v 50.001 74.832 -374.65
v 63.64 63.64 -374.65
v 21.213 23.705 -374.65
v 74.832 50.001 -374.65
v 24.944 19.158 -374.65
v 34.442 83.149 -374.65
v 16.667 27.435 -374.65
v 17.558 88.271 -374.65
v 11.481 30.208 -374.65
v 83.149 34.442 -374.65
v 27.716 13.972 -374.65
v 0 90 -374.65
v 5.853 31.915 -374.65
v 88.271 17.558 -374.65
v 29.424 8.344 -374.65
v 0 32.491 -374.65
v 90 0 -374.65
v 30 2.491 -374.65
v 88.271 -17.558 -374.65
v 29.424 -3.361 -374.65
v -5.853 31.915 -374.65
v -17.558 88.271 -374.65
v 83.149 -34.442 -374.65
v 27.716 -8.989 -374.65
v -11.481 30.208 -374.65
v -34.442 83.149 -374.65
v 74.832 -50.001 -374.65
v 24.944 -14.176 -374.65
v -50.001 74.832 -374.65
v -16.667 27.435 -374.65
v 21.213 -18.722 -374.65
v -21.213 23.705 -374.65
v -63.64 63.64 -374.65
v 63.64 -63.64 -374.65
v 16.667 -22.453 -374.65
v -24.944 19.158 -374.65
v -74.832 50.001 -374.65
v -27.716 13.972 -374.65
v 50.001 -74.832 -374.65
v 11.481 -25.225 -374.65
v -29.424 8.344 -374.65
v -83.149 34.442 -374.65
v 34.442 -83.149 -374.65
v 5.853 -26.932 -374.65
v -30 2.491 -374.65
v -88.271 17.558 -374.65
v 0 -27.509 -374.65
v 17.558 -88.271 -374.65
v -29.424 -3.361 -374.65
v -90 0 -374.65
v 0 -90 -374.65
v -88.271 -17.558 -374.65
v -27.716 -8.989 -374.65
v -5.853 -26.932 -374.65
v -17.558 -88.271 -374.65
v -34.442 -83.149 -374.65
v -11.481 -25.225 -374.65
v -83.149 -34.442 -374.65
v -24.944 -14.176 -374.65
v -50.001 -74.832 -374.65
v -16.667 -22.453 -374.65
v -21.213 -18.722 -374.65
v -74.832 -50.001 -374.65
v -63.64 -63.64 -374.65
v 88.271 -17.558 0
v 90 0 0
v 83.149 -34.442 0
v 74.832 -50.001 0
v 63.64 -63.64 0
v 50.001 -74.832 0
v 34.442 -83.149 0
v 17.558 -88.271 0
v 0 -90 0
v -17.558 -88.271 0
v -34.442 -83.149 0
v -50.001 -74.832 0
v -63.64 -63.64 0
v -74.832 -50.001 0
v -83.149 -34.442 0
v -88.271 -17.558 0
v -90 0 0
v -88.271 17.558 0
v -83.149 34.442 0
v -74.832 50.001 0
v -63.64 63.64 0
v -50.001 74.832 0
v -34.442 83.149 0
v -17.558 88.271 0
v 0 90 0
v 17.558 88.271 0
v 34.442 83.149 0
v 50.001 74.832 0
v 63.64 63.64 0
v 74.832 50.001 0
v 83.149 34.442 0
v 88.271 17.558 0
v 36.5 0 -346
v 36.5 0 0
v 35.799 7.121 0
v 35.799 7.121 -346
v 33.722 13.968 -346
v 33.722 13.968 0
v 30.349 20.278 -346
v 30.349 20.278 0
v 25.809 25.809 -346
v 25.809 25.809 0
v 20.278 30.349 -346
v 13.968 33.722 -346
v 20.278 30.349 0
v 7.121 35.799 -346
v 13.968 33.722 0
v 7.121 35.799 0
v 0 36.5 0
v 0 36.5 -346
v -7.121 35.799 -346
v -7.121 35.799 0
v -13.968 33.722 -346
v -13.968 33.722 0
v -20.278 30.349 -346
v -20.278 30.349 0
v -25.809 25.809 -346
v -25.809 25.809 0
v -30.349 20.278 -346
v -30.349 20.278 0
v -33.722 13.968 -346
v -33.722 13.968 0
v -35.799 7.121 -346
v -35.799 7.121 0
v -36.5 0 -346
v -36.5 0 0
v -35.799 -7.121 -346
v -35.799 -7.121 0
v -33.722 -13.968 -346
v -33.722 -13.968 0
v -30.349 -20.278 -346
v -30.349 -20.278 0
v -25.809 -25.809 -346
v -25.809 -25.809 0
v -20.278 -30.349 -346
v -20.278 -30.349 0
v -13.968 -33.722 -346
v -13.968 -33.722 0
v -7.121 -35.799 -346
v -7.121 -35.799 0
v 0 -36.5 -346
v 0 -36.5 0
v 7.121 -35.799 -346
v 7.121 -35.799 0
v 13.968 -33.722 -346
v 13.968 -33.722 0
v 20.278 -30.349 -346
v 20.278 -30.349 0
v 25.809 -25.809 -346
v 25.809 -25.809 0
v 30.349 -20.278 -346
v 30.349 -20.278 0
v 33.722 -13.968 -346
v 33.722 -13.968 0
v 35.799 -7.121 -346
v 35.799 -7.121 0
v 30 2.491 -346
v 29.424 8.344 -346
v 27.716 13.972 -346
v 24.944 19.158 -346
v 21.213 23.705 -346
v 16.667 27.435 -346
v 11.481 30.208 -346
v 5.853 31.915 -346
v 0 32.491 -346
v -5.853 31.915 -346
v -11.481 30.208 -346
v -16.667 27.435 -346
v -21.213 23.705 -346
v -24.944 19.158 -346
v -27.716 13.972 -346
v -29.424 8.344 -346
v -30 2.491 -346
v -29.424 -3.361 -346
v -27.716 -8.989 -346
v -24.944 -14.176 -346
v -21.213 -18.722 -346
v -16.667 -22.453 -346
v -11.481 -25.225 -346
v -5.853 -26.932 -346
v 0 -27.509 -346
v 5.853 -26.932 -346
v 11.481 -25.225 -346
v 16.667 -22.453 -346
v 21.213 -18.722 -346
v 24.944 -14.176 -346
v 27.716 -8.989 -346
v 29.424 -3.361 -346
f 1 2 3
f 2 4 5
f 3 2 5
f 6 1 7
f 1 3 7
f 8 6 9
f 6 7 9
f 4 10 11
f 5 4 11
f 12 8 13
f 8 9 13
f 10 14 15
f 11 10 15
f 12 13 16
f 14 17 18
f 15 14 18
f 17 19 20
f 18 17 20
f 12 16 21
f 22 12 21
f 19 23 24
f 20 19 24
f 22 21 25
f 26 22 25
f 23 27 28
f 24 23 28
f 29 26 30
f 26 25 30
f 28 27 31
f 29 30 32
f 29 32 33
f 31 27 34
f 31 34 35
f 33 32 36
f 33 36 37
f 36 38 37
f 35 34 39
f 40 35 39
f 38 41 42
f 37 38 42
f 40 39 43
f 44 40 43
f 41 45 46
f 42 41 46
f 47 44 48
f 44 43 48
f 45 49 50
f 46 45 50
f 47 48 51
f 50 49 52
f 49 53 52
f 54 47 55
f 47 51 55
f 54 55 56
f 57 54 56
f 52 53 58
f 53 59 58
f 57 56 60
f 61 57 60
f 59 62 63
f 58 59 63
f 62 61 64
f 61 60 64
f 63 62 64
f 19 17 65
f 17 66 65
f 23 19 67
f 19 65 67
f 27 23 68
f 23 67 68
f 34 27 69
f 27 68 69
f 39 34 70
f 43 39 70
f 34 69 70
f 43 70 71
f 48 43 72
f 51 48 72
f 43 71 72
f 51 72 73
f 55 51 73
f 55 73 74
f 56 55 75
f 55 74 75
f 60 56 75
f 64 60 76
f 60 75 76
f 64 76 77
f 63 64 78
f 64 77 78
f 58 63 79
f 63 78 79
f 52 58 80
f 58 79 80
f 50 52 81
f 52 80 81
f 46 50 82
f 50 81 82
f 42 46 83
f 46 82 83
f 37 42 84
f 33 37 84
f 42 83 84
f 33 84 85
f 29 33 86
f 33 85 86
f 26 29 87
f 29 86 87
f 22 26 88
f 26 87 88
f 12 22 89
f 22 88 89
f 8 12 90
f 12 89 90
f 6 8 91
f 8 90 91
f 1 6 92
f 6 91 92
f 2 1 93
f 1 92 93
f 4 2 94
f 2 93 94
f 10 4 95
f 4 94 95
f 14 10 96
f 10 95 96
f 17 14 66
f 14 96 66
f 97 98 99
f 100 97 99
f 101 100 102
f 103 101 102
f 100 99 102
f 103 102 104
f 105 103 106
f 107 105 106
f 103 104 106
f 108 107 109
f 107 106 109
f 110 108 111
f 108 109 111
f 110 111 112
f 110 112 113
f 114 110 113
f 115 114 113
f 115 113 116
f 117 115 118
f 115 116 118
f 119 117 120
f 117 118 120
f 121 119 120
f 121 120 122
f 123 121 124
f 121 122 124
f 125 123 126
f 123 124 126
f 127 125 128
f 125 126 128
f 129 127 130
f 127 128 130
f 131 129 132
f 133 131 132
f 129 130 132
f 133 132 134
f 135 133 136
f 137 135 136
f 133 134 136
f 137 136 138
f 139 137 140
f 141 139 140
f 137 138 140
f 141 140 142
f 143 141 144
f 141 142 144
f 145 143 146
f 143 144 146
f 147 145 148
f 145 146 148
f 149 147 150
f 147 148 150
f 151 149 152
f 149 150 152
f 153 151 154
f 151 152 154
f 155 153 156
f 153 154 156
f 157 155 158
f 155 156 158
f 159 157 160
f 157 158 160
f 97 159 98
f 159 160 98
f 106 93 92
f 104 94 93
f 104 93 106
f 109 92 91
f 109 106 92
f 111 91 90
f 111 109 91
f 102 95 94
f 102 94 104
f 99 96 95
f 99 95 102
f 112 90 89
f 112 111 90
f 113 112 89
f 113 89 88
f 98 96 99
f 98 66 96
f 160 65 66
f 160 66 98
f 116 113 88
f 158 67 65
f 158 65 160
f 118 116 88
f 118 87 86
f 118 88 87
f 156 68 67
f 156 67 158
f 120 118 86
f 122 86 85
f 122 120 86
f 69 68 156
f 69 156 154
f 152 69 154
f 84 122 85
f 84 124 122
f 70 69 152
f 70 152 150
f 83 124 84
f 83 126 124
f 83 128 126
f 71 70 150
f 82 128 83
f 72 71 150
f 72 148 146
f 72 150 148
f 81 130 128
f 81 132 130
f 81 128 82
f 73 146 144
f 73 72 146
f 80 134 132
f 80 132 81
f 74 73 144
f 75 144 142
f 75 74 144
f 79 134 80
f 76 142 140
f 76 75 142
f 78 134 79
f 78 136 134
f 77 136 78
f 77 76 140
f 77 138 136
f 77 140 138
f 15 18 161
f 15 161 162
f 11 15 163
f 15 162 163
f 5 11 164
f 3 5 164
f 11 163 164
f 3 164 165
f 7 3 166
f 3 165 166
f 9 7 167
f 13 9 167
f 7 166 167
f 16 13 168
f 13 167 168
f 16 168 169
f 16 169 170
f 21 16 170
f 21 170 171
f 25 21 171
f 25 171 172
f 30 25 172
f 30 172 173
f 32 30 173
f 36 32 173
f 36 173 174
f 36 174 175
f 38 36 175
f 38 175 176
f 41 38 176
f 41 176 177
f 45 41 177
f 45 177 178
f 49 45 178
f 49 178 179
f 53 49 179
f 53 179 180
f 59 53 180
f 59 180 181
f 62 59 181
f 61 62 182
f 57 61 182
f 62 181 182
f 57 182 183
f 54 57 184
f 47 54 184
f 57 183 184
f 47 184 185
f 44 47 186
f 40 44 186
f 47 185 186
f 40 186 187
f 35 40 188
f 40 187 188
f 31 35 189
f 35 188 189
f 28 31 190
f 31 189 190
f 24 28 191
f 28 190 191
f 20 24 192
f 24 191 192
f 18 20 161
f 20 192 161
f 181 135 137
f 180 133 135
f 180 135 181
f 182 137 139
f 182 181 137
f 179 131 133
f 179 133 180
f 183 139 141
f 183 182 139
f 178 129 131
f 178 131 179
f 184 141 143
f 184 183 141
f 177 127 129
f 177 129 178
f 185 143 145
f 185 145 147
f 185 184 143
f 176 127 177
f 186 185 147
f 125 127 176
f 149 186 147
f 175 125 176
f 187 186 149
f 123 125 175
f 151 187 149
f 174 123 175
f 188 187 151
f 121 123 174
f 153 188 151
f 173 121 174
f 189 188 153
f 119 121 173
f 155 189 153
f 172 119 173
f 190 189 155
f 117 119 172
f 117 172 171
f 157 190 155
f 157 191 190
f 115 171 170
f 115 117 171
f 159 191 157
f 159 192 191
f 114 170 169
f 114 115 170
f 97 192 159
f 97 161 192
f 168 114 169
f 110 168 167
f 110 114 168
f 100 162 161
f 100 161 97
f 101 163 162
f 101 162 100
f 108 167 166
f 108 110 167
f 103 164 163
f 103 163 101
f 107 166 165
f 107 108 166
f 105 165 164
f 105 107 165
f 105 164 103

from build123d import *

# Parameters (mm, degrees)
F0_W     = 90
F0_H     = 374.65
F2_R     = 30
F3_DEPTH = 374.651
F4_R     = 36.5
F4_R_2   = 30
F5_DEPTH = 346


with BuildPart() as f1:
    # F0 (on Front) → F1 (revolve)
    with BuildSketch(Plane.XZ):
        with Locations((45, -187.325)):
            Rectangle(F0_W, F0_H)
    revolve(axis=Axis((0, 0, -187.325), (0, 0, -1)))

    # F2 (on face) → F3 (cut, through all)
    with BuildSketch(Plane.XY):
        with Locations((0, 2.491364)):
            Circle(F2_R)
    extrude(amount=-F3_DEPTH, mode=Mode.SUBTRACT)

    # F4 (on face) → F5 (cut)
    with BuildSketch(Plane.XY):
        Circle(F4_R)
        with Locations((0, 2.491364)):
            Circle(F4_R_2, mode=Mode.SUBTRACT)
    extrude(amount=-F5_DEPTH, mode=Mode.SUBTRACT)


solid = f1.part
